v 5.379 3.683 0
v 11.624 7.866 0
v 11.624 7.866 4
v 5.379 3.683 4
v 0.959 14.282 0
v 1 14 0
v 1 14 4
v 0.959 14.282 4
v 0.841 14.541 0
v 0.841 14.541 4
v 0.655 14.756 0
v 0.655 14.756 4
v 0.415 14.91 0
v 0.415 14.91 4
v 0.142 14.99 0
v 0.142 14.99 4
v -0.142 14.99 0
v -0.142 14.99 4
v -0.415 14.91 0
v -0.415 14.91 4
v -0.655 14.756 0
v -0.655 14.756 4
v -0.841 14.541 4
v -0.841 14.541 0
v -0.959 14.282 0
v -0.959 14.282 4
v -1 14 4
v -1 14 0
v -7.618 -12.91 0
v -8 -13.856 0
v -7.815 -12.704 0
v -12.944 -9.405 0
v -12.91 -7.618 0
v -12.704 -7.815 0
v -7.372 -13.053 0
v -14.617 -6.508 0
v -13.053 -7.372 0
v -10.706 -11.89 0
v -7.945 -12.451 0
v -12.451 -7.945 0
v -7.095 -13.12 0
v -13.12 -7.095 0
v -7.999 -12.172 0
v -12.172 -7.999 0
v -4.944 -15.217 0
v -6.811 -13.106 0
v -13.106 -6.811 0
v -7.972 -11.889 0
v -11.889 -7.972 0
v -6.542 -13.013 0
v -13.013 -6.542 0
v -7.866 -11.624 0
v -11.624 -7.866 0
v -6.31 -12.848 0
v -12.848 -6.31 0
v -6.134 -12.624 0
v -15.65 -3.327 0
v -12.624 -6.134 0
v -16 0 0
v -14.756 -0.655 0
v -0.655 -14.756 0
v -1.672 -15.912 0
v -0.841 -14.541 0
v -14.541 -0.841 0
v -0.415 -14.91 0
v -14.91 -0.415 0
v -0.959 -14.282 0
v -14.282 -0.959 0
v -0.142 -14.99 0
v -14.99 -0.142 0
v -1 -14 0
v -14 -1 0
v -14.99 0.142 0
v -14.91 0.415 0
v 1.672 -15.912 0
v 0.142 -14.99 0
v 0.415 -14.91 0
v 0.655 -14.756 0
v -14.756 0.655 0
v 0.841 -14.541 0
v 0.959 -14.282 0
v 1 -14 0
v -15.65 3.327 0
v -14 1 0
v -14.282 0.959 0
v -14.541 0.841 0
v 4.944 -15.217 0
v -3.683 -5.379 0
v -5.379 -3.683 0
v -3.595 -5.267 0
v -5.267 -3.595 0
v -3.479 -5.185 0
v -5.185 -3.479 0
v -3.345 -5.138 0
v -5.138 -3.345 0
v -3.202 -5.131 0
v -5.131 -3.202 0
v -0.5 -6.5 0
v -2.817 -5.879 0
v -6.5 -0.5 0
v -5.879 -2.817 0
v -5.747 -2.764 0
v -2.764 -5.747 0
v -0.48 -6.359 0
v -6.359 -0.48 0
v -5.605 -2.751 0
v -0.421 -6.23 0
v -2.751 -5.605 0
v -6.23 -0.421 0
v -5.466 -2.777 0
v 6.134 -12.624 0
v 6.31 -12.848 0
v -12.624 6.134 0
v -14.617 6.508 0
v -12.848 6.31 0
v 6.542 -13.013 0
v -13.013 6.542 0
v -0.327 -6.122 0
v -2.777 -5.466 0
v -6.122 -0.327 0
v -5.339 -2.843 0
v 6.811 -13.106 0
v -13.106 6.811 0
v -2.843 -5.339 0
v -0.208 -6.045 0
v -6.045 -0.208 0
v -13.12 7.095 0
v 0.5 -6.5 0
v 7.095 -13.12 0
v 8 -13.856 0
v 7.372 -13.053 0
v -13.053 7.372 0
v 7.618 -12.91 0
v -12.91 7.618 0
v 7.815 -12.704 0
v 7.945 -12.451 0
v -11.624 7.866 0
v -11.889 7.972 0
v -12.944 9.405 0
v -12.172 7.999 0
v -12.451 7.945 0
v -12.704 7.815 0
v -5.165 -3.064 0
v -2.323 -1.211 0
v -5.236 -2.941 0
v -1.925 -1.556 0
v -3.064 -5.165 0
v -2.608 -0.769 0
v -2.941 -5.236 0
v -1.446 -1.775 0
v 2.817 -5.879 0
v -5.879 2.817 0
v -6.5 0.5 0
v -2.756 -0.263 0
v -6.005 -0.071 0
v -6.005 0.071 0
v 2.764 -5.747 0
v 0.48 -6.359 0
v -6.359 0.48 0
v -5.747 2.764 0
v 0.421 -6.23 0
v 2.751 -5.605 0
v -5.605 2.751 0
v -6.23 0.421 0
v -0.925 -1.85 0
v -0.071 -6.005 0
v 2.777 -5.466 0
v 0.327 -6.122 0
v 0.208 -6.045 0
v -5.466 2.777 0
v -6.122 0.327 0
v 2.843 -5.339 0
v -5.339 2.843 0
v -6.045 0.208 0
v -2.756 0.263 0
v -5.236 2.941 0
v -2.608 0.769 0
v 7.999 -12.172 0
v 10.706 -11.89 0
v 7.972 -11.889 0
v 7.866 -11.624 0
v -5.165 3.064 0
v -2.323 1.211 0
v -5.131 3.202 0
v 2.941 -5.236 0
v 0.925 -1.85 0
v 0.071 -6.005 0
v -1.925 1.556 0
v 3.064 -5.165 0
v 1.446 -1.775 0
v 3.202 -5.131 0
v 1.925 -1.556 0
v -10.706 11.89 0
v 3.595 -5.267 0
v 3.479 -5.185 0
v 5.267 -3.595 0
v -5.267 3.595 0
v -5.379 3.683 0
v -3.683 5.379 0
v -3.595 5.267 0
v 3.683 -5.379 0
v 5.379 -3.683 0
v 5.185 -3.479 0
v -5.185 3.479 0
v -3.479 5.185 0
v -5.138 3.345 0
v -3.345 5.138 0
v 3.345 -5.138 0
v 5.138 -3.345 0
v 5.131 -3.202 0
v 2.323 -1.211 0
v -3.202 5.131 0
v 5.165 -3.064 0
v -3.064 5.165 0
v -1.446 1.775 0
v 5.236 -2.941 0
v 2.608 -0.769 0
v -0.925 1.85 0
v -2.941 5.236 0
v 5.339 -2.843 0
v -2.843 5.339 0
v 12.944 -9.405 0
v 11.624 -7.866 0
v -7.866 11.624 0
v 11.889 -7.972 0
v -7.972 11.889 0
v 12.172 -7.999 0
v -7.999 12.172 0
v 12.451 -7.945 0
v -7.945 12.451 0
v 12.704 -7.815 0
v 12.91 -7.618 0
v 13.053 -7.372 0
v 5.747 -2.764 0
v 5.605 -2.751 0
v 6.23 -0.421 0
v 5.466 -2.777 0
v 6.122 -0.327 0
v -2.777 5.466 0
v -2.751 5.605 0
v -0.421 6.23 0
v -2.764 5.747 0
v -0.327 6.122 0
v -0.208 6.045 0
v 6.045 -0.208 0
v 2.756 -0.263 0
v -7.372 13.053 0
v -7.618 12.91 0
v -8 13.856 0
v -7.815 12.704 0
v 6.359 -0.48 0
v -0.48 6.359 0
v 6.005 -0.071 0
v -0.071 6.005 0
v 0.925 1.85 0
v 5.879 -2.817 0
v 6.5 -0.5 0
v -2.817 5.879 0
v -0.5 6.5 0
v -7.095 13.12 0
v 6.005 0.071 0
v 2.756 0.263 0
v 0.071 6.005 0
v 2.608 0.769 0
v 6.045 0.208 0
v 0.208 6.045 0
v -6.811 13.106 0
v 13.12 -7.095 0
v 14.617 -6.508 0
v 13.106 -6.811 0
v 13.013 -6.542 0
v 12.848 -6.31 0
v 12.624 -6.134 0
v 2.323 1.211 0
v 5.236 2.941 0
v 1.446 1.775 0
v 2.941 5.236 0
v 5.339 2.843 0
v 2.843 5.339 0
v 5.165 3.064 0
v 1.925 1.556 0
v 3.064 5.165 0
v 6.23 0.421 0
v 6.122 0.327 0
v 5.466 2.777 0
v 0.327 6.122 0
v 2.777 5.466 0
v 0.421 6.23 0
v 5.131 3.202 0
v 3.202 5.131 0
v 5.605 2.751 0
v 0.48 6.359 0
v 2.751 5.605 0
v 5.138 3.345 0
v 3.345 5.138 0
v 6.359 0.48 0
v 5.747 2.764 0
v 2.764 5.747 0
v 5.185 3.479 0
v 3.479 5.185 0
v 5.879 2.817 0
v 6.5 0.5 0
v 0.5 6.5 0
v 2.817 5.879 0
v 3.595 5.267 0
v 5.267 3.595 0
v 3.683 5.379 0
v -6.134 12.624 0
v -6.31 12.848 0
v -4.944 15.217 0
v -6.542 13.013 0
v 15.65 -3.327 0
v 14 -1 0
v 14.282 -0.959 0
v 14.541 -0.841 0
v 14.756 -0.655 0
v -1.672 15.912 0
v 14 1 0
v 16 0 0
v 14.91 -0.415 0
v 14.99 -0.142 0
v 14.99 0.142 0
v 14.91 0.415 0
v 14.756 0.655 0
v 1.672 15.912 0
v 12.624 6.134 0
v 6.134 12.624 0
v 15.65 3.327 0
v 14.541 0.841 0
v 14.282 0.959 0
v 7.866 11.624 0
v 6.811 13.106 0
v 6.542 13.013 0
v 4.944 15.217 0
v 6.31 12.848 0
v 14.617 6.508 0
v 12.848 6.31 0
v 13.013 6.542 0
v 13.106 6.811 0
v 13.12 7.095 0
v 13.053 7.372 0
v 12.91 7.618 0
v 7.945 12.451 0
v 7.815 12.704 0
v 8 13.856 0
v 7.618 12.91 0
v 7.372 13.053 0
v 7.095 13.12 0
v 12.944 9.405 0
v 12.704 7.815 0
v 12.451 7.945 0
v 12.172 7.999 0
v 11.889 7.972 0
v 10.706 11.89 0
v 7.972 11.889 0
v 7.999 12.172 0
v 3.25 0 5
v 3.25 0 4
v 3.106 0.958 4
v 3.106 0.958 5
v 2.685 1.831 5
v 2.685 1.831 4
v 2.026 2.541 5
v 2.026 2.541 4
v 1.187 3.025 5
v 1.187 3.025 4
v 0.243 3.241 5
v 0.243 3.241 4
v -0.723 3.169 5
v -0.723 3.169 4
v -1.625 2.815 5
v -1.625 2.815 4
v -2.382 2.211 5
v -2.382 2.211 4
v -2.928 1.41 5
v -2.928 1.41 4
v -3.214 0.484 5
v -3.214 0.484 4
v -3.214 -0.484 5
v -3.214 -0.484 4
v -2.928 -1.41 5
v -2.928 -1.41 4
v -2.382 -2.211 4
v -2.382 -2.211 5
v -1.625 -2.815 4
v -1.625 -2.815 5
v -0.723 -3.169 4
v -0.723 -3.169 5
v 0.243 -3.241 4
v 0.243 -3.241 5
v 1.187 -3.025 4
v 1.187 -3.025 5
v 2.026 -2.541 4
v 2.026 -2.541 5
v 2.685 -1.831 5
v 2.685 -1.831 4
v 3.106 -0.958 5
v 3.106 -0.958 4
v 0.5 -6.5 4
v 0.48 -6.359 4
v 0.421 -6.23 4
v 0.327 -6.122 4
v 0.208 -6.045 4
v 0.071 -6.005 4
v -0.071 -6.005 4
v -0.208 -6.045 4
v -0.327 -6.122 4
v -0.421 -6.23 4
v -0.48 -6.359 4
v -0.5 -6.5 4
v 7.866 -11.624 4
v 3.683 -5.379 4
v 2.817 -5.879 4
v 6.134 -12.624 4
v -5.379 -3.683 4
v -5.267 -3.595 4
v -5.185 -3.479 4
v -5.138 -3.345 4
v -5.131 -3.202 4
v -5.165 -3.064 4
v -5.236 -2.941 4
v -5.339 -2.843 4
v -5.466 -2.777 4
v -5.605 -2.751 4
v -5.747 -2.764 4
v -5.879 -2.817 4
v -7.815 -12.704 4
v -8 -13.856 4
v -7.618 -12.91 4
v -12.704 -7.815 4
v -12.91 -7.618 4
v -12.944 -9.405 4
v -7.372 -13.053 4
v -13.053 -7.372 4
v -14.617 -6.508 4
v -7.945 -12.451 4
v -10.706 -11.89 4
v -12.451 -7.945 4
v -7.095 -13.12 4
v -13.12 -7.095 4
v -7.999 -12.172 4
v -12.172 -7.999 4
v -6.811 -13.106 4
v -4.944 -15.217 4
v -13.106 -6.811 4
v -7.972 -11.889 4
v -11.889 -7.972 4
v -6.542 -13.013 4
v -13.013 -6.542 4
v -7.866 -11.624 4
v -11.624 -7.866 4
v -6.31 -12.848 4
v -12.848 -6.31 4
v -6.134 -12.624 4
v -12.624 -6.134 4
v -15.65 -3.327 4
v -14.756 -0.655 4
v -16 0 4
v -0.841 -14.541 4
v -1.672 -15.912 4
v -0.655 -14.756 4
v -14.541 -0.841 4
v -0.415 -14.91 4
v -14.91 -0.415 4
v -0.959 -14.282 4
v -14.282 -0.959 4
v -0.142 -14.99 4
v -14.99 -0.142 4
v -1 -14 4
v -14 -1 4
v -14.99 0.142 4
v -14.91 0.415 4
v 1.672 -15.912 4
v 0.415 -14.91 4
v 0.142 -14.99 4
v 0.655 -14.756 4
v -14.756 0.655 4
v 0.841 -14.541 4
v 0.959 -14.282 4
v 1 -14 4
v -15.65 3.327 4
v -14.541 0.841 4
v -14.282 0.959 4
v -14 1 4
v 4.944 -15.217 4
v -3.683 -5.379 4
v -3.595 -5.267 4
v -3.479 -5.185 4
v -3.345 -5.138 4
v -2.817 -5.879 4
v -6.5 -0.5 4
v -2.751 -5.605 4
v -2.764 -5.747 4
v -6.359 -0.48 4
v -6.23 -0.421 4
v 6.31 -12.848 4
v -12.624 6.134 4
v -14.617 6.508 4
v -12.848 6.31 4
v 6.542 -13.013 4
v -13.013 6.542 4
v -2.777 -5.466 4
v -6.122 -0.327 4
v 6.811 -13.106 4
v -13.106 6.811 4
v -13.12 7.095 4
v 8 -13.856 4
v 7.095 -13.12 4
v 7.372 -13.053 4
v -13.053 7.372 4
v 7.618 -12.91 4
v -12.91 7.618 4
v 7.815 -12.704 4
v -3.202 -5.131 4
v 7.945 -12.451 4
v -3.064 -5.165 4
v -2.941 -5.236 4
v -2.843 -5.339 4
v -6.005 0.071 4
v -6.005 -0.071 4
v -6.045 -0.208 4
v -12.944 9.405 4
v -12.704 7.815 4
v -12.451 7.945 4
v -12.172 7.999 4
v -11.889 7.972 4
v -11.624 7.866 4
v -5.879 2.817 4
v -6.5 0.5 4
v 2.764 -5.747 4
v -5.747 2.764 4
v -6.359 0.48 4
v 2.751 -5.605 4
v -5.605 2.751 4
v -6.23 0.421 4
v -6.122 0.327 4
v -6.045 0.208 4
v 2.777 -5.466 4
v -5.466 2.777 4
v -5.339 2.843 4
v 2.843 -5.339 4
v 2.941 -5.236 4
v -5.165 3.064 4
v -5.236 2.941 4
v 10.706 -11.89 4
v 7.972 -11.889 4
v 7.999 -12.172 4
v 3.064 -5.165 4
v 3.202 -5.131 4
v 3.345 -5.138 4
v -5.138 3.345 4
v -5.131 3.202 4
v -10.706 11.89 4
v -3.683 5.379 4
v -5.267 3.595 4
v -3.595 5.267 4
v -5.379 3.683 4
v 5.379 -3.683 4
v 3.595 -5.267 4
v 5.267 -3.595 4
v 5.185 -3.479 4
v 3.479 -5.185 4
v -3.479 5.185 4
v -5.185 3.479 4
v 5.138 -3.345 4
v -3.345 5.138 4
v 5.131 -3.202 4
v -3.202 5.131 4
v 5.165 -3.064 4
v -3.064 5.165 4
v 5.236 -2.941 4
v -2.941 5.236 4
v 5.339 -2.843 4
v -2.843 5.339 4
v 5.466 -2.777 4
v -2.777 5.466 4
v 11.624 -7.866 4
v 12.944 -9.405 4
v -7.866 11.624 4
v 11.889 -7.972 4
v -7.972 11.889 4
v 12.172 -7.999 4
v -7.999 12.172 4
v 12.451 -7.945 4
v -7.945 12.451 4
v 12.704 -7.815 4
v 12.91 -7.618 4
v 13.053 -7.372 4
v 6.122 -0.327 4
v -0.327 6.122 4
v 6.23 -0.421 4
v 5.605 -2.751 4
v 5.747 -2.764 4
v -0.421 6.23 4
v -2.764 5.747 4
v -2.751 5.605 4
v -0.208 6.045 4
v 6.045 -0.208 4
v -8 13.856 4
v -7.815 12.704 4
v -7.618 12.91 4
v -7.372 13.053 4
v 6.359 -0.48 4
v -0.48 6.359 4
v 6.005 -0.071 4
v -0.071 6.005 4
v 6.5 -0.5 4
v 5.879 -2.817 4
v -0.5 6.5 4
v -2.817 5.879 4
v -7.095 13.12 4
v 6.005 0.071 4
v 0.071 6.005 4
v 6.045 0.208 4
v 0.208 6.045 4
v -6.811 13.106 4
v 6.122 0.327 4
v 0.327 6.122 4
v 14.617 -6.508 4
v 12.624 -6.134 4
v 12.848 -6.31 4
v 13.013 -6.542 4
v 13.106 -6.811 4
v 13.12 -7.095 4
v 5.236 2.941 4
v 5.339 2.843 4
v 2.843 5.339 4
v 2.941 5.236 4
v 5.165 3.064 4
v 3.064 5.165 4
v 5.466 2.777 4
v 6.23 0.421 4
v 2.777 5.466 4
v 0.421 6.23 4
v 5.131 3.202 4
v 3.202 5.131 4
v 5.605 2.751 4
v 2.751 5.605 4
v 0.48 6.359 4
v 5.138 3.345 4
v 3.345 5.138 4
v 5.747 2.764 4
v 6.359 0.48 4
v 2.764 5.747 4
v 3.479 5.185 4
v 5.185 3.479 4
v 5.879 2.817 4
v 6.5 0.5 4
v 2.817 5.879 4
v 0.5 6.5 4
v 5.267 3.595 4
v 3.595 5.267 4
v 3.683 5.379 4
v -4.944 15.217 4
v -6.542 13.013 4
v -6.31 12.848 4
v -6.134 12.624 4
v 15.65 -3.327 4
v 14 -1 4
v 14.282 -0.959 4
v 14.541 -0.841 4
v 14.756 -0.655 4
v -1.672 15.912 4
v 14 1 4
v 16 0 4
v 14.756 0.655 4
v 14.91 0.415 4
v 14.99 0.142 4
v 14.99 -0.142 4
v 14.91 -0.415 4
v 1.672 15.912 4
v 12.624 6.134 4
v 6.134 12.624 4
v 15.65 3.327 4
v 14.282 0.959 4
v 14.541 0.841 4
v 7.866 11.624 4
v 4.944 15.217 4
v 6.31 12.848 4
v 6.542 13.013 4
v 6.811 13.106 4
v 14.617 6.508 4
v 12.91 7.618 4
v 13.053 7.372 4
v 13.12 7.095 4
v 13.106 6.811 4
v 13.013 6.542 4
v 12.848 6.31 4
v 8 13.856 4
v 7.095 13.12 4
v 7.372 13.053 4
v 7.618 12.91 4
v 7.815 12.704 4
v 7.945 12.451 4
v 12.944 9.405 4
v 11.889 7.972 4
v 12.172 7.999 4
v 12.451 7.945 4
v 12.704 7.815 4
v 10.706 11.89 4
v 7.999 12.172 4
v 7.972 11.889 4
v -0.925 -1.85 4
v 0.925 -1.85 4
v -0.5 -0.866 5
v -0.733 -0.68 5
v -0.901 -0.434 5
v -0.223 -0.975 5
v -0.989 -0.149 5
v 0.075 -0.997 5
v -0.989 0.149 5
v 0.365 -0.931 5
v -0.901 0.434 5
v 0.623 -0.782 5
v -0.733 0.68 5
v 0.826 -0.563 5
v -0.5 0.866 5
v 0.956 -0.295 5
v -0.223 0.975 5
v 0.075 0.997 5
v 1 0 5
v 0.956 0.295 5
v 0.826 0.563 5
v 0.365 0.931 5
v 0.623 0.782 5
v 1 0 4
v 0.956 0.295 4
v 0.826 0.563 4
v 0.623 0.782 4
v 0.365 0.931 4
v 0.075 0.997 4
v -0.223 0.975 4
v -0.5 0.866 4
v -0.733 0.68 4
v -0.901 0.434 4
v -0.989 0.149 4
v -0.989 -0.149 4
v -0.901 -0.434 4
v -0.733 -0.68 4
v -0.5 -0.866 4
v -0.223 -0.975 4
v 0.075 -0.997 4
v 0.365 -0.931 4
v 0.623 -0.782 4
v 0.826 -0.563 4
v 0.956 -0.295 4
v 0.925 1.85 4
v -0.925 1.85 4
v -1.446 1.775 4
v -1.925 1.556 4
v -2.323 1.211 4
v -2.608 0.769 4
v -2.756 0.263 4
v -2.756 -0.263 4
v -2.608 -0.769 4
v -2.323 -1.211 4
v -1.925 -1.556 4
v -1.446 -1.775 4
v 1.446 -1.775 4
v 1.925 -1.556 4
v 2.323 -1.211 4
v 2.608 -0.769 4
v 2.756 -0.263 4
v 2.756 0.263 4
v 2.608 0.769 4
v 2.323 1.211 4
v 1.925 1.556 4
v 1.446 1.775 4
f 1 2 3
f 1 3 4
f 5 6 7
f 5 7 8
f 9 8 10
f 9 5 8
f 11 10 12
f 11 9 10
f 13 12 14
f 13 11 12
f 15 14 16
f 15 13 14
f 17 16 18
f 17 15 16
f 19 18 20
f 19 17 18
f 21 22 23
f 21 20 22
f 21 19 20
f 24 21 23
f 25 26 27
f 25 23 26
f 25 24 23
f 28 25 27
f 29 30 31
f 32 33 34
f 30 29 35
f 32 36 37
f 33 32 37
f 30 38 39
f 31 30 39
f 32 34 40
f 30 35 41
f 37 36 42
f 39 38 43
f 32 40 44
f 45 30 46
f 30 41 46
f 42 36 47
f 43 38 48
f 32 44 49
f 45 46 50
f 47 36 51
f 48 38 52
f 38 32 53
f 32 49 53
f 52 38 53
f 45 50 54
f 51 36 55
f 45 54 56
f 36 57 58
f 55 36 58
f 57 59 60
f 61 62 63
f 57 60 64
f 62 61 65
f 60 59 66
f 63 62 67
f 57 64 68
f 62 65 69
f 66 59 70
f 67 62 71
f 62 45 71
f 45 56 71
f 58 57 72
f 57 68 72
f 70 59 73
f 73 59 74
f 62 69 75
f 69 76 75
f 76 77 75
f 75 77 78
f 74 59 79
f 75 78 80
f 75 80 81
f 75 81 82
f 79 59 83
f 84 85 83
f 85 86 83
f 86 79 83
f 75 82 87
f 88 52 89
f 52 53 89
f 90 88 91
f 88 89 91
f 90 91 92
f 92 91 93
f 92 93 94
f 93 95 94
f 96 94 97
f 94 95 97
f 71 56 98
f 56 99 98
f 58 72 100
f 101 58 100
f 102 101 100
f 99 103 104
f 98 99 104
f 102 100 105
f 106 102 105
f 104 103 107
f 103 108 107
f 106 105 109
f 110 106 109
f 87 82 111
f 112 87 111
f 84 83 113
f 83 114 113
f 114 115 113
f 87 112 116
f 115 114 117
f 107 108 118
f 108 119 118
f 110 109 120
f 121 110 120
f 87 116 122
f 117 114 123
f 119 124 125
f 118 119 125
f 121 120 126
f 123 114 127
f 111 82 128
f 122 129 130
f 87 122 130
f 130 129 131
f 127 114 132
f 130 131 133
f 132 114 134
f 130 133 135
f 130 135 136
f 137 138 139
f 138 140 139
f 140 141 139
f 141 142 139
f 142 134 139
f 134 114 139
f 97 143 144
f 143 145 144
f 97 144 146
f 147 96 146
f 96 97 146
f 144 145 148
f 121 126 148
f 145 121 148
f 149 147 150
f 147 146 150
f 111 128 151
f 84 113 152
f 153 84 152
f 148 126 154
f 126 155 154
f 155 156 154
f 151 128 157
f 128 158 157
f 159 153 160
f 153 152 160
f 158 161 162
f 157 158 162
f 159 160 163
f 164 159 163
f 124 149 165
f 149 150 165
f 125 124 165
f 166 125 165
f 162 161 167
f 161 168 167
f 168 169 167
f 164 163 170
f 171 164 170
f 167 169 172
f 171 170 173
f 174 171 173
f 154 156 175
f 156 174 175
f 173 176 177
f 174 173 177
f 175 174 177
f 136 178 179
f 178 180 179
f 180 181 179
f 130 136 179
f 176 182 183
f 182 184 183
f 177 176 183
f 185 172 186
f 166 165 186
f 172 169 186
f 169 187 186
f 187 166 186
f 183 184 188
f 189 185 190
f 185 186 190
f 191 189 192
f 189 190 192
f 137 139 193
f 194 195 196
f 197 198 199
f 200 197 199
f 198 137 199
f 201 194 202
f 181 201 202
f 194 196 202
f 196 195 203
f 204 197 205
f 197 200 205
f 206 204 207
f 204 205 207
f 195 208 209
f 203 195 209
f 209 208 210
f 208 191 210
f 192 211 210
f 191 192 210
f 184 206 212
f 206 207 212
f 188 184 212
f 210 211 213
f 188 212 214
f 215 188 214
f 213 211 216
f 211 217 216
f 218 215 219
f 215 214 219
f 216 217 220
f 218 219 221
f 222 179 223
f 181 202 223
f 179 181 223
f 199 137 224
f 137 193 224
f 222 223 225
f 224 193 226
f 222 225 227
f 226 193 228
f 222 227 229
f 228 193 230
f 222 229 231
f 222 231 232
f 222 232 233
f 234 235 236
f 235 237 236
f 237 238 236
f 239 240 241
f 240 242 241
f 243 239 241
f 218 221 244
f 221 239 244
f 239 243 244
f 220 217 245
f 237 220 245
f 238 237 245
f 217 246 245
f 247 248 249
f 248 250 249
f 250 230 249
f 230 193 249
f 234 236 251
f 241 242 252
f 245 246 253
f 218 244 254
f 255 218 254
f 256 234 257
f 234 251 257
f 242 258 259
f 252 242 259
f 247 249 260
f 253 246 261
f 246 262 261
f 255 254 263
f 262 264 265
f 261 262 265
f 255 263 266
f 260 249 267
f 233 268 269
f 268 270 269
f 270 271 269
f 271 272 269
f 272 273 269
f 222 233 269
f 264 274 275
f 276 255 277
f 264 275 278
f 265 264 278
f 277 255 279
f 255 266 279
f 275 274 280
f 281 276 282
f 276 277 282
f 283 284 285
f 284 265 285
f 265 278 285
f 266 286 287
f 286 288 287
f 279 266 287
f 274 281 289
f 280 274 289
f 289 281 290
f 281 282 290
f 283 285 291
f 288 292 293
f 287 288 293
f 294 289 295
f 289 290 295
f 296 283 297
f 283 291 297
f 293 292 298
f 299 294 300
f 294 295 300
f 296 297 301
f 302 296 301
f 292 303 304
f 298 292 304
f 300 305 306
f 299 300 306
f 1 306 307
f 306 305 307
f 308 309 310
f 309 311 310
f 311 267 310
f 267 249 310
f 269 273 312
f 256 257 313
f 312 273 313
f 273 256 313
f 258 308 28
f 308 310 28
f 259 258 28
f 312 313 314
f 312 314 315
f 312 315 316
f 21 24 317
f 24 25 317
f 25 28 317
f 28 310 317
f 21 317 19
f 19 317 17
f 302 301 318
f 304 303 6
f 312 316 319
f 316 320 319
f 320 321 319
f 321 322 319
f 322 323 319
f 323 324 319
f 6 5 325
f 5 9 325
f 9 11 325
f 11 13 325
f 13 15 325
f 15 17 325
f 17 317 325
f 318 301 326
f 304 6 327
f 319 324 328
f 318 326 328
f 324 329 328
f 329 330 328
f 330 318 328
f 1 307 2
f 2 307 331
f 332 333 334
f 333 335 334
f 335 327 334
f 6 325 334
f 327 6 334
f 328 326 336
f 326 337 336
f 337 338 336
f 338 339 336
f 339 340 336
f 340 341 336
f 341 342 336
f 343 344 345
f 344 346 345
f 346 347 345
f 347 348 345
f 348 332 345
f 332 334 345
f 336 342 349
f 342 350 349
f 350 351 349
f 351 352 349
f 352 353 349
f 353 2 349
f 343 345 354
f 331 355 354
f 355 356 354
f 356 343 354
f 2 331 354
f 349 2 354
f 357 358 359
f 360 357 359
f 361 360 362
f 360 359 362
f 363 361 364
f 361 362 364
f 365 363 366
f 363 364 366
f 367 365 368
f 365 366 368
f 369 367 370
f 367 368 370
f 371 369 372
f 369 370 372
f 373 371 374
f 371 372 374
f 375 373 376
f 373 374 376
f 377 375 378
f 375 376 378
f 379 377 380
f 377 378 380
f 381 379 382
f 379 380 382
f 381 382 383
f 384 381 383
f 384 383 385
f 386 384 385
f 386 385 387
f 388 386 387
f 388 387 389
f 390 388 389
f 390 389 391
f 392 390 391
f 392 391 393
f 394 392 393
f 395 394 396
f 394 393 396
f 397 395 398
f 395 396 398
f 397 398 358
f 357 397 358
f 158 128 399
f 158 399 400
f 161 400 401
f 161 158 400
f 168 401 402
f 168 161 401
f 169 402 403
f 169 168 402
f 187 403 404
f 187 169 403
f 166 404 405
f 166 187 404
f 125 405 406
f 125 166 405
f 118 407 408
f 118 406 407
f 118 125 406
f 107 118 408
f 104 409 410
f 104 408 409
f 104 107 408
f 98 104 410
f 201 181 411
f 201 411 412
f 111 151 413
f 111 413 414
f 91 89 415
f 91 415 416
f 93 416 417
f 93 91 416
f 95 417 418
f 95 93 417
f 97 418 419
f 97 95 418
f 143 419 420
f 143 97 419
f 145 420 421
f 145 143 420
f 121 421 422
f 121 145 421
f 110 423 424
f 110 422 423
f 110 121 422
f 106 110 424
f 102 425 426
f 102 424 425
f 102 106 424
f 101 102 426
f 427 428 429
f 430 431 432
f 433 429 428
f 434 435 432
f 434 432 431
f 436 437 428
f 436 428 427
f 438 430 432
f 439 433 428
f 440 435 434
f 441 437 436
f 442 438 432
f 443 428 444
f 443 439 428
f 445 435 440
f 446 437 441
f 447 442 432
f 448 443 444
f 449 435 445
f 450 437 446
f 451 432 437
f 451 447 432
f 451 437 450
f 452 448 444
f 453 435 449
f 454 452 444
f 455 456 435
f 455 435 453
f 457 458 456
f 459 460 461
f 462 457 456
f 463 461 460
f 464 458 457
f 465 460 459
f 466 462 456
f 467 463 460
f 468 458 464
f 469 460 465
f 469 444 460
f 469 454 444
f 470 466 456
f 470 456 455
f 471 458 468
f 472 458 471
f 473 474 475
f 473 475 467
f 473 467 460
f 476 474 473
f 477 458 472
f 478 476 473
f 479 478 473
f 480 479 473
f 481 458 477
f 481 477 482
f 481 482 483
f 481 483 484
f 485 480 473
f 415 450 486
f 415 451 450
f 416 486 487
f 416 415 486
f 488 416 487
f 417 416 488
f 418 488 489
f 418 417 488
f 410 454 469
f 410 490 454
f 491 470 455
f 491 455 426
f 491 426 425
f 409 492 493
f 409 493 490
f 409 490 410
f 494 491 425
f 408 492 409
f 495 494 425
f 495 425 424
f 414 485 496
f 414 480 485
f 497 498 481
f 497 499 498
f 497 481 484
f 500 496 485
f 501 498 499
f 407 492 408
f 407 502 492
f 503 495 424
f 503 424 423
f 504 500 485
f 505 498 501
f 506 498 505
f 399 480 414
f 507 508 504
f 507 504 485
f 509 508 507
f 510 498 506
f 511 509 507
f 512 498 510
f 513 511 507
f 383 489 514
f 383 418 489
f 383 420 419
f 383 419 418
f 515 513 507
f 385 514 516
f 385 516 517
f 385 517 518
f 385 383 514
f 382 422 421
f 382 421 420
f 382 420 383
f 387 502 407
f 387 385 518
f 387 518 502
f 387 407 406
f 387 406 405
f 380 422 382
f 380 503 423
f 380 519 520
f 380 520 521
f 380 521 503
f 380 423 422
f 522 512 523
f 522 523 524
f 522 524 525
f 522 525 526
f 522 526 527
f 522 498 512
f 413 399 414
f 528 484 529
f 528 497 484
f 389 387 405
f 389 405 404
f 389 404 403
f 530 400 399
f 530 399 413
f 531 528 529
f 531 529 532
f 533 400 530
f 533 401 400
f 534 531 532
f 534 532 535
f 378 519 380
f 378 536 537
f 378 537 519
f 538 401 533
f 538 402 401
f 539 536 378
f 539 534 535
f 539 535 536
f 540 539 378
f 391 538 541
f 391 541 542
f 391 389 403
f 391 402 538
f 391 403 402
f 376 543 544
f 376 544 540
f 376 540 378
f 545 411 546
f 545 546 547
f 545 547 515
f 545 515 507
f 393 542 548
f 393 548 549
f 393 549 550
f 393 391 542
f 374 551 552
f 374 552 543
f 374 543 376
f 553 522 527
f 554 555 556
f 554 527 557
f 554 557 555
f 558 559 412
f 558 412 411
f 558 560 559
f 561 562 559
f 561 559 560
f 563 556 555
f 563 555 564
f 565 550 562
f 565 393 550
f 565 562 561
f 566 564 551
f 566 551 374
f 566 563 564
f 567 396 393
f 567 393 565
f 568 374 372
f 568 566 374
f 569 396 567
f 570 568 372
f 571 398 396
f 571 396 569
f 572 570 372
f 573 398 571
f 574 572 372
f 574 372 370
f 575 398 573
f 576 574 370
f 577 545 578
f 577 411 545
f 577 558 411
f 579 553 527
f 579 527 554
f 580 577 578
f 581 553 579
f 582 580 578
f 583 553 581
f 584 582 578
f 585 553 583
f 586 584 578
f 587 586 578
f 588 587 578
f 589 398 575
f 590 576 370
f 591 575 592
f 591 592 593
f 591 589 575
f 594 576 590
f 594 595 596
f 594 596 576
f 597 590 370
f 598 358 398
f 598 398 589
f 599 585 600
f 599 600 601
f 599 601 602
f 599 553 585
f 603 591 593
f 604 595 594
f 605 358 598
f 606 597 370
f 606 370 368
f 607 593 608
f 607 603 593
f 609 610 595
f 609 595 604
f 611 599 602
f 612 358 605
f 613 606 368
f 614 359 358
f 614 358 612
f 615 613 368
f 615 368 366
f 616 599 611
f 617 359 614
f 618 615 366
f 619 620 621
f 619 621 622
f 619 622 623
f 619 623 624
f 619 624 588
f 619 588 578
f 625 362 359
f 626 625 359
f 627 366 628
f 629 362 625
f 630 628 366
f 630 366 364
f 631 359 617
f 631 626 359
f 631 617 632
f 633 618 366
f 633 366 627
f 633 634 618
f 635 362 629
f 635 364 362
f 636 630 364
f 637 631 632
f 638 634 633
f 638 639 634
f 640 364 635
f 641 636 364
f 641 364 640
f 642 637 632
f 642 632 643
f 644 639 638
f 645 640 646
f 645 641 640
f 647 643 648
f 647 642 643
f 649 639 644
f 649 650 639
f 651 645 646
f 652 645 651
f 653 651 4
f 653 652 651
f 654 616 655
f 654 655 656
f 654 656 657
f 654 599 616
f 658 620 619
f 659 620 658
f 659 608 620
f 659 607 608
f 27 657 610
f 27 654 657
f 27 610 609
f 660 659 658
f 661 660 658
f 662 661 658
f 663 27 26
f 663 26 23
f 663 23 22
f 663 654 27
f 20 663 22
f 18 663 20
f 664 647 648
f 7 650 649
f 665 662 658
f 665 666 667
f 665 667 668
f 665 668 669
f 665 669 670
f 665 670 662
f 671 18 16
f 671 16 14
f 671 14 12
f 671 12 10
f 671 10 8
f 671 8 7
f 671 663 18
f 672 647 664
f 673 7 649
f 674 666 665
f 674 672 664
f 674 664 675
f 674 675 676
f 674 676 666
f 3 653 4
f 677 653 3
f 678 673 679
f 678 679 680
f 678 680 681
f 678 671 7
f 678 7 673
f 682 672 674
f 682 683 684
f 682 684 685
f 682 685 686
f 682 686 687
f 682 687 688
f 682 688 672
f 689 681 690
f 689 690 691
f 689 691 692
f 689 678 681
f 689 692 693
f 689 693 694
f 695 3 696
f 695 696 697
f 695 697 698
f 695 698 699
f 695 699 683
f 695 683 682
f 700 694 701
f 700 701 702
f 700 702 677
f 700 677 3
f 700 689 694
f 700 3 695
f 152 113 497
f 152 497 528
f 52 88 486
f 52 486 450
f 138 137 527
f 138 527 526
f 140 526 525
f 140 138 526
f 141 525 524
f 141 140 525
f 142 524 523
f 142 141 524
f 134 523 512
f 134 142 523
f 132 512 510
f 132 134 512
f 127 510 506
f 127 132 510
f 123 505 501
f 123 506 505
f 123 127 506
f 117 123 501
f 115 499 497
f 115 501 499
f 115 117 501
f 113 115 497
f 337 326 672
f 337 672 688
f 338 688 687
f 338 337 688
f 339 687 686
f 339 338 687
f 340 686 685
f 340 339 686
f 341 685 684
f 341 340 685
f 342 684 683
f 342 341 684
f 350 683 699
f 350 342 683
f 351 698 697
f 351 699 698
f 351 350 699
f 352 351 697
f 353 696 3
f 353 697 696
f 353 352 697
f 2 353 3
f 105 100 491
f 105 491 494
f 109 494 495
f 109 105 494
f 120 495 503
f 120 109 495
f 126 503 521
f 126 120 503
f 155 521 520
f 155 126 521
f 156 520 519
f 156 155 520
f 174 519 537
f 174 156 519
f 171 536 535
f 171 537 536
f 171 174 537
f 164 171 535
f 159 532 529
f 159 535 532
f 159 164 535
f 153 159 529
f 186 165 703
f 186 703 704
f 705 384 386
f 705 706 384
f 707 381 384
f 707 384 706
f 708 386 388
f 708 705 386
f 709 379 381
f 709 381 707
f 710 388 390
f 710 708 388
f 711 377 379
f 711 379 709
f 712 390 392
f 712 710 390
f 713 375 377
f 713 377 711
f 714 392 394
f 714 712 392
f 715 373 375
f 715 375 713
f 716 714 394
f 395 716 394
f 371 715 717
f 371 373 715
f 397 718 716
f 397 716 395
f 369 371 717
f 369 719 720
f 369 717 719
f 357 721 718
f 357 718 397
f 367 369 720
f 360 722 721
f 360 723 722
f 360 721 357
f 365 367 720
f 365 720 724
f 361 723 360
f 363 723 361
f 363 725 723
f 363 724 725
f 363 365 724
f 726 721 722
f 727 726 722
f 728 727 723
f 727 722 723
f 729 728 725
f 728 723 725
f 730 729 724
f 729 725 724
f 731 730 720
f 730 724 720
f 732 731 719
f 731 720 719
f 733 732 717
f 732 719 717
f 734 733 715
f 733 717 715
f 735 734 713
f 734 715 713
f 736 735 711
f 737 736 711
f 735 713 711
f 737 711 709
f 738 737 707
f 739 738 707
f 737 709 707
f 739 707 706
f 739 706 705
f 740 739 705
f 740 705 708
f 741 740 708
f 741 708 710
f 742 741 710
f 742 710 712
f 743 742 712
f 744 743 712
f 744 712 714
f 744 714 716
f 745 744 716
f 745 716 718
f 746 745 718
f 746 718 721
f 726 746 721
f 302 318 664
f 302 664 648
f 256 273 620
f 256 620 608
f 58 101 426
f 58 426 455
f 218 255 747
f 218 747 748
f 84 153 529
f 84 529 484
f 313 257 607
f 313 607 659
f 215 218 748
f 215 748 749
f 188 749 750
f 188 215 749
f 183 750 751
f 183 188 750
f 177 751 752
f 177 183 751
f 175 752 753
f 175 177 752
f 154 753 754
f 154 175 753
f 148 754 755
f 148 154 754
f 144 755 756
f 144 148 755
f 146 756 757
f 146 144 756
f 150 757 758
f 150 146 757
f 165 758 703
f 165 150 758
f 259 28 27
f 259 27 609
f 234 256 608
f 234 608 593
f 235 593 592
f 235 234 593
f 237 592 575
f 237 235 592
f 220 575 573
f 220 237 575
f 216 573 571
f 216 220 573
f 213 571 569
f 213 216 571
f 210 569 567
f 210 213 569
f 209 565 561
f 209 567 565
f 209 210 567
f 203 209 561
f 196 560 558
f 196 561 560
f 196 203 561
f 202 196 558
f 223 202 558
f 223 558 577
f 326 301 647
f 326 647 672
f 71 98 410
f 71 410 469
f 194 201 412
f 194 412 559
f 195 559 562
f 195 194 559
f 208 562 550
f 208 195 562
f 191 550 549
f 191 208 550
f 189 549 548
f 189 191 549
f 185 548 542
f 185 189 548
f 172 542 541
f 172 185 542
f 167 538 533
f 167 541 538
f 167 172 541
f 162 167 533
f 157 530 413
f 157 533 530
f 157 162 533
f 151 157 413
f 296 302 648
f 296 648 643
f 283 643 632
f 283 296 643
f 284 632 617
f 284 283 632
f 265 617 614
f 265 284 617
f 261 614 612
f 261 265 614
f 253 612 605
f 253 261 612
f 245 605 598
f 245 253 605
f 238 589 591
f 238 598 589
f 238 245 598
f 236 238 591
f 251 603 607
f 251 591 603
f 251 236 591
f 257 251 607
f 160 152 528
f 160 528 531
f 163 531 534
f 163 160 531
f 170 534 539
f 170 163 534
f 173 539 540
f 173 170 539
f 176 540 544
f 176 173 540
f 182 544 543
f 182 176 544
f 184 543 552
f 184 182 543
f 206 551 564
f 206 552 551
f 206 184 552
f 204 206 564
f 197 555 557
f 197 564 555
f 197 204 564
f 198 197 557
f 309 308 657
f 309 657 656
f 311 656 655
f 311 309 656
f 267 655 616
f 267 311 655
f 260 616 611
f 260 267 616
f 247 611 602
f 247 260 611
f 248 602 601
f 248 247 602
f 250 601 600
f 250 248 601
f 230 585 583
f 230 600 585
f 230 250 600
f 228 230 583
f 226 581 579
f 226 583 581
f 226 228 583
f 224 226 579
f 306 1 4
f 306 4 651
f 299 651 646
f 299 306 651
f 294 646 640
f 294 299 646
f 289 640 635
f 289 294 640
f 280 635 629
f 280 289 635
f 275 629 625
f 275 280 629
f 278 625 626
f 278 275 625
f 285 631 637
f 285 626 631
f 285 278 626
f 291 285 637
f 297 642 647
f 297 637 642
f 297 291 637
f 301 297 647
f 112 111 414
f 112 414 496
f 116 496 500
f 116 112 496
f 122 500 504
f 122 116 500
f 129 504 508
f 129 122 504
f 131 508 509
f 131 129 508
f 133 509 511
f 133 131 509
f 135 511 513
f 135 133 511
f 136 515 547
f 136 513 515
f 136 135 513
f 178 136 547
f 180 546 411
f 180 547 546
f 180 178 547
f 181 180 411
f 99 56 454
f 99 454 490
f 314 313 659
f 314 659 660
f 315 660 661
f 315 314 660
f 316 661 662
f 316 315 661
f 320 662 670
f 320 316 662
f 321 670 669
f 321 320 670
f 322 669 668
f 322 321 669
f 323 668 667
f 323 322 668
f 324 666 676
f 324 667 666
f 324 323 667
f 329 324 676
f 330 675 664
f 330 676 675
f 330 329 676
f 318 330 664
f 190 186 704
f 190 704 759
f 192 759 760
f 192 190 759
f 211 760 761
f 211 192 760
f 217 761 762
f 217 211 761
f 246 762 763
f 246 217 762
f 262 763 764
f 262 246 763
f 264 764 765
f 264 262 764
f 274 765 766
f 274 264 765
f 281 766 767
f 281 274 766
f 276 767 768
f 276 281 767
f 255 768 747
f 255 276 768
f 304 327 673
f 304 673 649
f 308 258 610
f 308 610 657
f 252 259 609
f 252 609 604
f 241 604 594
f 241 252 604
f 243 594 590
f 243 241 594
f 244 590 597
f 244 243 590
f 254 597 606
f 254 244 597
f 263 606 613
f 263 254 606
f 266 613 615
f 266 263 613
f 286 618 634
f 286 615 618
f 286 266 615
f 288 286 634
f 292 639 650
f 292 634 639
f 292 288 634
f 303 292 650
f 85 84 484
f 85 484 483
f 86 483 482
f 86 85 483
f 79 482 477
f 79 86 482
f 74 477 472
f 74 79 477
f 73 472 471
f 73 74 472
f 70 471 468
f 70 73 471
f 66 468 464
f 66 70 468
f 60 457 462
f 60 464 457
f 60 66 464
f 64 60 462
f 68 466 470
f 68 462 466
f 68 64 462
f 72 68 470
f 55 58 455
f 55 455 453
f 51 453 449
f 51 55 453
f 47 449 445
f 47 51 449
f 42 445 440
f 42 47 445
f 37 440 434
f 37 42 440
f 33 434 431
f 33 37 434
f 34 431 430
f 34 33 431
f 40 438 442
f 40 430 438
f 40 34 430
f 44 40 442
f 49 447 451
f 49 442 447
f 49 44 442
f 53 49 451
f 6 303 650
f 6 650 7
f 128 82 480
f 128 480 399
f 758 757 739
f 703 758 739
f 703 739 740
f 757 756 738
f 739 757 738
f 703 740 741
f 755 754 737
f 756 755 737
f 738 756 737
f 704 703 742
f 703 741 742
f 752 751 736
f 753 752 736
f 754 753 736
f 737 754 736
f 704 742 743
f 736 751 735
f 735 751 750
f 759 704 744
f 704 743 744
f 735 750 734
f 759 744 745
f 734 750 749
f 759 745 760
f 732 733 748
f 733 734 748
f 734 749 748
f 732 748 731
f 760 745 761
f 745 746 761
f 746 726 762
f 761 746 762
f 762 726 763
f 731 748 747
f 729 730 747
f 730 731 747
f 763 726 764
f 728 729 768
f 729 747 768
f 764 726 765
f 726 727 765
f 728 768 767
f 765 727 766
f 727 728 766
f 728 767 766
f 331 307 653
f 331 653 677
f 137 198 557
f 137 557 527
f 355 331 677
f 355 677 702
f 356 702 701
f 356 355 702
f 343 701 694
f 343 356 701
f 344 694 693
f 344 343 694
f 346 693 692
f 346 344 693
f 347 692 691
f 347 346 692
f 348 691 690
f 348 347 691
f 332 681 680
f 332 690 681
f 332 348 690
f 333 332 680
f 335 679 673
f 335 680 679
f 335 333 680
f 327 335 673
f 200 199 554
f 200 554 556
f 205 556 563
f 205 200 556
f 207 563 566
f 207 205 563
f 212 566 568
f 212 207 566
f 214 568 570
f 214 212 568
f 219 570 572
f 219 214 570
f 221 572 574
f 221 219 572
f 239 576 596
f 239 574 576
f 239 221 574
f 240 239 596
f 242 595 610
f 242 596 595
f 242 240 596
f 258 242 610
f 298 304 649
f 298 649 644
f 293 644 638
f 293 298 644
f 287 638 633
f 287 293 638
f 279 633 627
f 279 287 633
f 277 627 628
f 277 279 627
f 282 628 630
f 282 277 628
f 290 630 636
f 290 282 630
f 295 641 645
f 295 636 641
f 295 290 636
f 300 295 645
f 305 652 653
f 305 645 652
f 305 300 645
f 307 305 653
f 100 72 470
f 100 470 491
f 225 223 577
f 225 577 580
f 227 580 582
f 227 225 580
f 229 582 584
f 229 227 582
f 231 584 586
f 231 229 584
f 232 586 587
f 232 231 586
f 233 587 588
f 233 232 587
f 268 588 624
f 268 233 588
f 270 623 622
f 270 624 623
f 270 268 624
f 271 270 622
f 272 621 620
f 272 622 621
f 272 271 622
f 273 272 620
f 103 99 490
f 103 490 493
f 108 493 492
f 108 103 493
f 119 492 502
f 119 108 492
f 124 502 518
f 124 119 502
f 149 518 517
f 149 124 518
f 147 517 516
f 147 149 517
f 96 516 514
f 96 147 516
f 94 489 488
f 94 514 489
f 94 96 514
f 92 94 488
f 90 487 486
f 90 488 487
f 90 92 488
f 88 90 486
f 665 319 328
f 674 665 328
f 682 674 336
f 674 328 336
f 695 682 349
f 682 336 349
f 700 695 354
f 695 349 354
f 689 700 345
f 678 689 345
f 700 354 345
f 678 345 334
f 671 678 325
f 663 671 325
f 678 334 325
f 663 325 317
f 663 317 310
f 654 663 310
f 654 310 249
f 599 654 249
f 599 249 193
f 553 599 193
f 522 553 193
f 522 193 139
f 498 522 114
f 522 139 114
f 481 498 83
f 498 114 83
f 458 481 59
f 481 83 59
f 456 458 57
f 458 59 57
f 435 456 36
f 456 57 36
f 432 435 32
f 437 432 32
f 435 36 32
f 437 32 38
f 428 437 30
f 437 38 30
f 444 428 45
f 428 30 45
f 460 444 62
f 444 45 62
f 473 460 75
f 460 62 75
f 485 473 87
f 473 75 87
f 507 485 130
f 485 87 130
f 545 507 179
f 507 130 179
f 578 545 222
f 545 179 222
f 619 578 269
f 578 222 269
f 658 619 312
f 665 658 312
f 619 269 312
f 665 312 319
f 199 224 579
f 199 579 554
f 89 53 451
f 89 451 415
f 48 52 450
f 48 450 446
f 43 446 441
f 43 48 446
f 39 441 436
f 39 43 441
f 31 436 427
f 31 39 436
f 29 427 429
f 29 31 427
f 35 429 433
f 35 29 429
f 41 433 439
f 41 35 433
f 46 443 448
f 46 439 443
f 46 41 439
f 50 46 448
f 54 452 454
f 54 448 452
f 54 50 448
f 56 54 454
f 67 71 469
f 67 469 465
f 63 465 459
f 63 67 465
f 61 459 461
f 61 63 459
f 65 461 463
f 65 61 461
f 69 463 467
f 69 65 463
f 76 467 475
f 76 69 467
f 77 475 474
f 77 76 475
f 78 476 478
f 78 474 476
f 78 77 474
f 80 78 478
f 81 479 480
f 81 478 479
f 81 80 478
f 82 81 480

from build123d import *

# Parameters (mm, degrees)
ESQUISSE1_R                  = 16
BOSS_EXTRU_1_DEPTH           = 4
ESQUISSE2_R                  = 3.25
BOSS_EXTRU_2_DEPTH           = 1
ENL_V_MAT_EXTRU_1_REACH      = 25.173
ESQUISSE3_R                  = 1
ENL_V_MAT_EXTRU_2_DEPTH      = 4
ENL_V_MAT_EXTRU_4_REACH      = 25.173
R_P_TITION_CIRCULAIRE1_COUNT = 12


with BuildPart() as part:
    # Esquisse1 → Boss.-Extru.1 (new body)
    with BuildSketch(Plane.XY):
        Circle(ESQUISSE1_R)
    extrude(amount=BOSS_EXTRU_1_DEPTH)

    # Esquisse2 → Boss.-Extru.2 (add)
    with BuildSketch(Plane.XY.offset(4)):
        Circle(ESQUISSE2_R)
    extrude(amount=BOSS_EXTRU_2_DEPTH)

    # Esquisse3 → Enlèv. mat.-Extru.1 (cut, up to next)
    with BuildSketch(Plane.XY.offset(5), mode=Mode.PRIVATE) as enl_v_mat_extru_1_sk1:
        Circle(ESQUISSE3_R)
    enl_v_mat_extru_1_tool1 = extrude(enl_v_mat_extru_1_sk1.sketch, amount=-ENL_V_MAT_EXTRU_1_REACH, mode=Mode.PRIVATE) & part.part
    add(enl_v_mat_extru_1_tool1.solids().sort_by_distance((0, 0, 5))[0], mode=Mode.SUBTRACT)

    # Esquisse4 → Enlèv. mat.-Extru.2 (cut)
    with BuildSketch(Plane(origin=(0, 0, 0), x_dir=(-1, 0, 0), z_dir=(0, 0, -1))):
        with BuildLine():
            Line((-0.925, 1.85), (0.925, 1.85))
            ThreePointArc((0.925, 1.85), (2.775, 0), (0.925, -1.85))
            Line((0.925, -1.85), (-0.925, -1.85))
            ThreePointArc((-0.925, -1.85), (-2.775, 0), (-0.925, 1.85))
        make_face()
    extrude(amount=-ENL_V_MAT_EXTRU_2_DEPTH, mode=Mode.SUBTRACT)

    # Esquisse5 → Enlèv. mat.-Extru.4 (cut, up to next)
    with BuildSketch(Plane(origin=(0, 0, 0), x_dir=(-1, 0, 0), z_dir=(0, 0, -1)), mode=Mode.PRIVATE) as enl_v_mat_extru_4_sk1:
        with BuildLine():
            Line((6.5, 0.5), (14, 1))
            ThreePointArc((14, 1), (15, 0), (14, -1))
            Line((14, -1), (6.5, -0.5))
            ThreePointArc((6.5, -0.5), (6, 0), (6.5, 0.5))
        make_face()
    enl_v_mat_extru_4_tool1 = extrude(enl_v_mat_extru_4_sk1.sketch, amount=-ENL_V_MAT_EXTRU_4_REACH, mode=Mode.PRIVATE) & part.part
    enl_v_mat_extru_4 = enl_v_mat_extru_4_tool1.solids().sort_by_distance((-10.983243, 0, 0))[0]
    add(enl_v_mat_extru_4, mode=Mode.SUBTRACT)

    # Répétition circulaire1: Enlèv. mat.-Extru.4 ×12 about axis
    r_p_tition_circulaire1_axis = Axis((0, 0, 0), (0, 0, 1))
    for i in range(1, R_P_TITION_CIRCULAIRE1_COUNT):
        add(enl_v_mat_extru_4.rotate(r_p_tition_circulaire1_axis, i * 360 / R_P_TITION_CIRCULAIRE1_COUNT), mode=Mode.SUBTRACT)


solid = part.part
